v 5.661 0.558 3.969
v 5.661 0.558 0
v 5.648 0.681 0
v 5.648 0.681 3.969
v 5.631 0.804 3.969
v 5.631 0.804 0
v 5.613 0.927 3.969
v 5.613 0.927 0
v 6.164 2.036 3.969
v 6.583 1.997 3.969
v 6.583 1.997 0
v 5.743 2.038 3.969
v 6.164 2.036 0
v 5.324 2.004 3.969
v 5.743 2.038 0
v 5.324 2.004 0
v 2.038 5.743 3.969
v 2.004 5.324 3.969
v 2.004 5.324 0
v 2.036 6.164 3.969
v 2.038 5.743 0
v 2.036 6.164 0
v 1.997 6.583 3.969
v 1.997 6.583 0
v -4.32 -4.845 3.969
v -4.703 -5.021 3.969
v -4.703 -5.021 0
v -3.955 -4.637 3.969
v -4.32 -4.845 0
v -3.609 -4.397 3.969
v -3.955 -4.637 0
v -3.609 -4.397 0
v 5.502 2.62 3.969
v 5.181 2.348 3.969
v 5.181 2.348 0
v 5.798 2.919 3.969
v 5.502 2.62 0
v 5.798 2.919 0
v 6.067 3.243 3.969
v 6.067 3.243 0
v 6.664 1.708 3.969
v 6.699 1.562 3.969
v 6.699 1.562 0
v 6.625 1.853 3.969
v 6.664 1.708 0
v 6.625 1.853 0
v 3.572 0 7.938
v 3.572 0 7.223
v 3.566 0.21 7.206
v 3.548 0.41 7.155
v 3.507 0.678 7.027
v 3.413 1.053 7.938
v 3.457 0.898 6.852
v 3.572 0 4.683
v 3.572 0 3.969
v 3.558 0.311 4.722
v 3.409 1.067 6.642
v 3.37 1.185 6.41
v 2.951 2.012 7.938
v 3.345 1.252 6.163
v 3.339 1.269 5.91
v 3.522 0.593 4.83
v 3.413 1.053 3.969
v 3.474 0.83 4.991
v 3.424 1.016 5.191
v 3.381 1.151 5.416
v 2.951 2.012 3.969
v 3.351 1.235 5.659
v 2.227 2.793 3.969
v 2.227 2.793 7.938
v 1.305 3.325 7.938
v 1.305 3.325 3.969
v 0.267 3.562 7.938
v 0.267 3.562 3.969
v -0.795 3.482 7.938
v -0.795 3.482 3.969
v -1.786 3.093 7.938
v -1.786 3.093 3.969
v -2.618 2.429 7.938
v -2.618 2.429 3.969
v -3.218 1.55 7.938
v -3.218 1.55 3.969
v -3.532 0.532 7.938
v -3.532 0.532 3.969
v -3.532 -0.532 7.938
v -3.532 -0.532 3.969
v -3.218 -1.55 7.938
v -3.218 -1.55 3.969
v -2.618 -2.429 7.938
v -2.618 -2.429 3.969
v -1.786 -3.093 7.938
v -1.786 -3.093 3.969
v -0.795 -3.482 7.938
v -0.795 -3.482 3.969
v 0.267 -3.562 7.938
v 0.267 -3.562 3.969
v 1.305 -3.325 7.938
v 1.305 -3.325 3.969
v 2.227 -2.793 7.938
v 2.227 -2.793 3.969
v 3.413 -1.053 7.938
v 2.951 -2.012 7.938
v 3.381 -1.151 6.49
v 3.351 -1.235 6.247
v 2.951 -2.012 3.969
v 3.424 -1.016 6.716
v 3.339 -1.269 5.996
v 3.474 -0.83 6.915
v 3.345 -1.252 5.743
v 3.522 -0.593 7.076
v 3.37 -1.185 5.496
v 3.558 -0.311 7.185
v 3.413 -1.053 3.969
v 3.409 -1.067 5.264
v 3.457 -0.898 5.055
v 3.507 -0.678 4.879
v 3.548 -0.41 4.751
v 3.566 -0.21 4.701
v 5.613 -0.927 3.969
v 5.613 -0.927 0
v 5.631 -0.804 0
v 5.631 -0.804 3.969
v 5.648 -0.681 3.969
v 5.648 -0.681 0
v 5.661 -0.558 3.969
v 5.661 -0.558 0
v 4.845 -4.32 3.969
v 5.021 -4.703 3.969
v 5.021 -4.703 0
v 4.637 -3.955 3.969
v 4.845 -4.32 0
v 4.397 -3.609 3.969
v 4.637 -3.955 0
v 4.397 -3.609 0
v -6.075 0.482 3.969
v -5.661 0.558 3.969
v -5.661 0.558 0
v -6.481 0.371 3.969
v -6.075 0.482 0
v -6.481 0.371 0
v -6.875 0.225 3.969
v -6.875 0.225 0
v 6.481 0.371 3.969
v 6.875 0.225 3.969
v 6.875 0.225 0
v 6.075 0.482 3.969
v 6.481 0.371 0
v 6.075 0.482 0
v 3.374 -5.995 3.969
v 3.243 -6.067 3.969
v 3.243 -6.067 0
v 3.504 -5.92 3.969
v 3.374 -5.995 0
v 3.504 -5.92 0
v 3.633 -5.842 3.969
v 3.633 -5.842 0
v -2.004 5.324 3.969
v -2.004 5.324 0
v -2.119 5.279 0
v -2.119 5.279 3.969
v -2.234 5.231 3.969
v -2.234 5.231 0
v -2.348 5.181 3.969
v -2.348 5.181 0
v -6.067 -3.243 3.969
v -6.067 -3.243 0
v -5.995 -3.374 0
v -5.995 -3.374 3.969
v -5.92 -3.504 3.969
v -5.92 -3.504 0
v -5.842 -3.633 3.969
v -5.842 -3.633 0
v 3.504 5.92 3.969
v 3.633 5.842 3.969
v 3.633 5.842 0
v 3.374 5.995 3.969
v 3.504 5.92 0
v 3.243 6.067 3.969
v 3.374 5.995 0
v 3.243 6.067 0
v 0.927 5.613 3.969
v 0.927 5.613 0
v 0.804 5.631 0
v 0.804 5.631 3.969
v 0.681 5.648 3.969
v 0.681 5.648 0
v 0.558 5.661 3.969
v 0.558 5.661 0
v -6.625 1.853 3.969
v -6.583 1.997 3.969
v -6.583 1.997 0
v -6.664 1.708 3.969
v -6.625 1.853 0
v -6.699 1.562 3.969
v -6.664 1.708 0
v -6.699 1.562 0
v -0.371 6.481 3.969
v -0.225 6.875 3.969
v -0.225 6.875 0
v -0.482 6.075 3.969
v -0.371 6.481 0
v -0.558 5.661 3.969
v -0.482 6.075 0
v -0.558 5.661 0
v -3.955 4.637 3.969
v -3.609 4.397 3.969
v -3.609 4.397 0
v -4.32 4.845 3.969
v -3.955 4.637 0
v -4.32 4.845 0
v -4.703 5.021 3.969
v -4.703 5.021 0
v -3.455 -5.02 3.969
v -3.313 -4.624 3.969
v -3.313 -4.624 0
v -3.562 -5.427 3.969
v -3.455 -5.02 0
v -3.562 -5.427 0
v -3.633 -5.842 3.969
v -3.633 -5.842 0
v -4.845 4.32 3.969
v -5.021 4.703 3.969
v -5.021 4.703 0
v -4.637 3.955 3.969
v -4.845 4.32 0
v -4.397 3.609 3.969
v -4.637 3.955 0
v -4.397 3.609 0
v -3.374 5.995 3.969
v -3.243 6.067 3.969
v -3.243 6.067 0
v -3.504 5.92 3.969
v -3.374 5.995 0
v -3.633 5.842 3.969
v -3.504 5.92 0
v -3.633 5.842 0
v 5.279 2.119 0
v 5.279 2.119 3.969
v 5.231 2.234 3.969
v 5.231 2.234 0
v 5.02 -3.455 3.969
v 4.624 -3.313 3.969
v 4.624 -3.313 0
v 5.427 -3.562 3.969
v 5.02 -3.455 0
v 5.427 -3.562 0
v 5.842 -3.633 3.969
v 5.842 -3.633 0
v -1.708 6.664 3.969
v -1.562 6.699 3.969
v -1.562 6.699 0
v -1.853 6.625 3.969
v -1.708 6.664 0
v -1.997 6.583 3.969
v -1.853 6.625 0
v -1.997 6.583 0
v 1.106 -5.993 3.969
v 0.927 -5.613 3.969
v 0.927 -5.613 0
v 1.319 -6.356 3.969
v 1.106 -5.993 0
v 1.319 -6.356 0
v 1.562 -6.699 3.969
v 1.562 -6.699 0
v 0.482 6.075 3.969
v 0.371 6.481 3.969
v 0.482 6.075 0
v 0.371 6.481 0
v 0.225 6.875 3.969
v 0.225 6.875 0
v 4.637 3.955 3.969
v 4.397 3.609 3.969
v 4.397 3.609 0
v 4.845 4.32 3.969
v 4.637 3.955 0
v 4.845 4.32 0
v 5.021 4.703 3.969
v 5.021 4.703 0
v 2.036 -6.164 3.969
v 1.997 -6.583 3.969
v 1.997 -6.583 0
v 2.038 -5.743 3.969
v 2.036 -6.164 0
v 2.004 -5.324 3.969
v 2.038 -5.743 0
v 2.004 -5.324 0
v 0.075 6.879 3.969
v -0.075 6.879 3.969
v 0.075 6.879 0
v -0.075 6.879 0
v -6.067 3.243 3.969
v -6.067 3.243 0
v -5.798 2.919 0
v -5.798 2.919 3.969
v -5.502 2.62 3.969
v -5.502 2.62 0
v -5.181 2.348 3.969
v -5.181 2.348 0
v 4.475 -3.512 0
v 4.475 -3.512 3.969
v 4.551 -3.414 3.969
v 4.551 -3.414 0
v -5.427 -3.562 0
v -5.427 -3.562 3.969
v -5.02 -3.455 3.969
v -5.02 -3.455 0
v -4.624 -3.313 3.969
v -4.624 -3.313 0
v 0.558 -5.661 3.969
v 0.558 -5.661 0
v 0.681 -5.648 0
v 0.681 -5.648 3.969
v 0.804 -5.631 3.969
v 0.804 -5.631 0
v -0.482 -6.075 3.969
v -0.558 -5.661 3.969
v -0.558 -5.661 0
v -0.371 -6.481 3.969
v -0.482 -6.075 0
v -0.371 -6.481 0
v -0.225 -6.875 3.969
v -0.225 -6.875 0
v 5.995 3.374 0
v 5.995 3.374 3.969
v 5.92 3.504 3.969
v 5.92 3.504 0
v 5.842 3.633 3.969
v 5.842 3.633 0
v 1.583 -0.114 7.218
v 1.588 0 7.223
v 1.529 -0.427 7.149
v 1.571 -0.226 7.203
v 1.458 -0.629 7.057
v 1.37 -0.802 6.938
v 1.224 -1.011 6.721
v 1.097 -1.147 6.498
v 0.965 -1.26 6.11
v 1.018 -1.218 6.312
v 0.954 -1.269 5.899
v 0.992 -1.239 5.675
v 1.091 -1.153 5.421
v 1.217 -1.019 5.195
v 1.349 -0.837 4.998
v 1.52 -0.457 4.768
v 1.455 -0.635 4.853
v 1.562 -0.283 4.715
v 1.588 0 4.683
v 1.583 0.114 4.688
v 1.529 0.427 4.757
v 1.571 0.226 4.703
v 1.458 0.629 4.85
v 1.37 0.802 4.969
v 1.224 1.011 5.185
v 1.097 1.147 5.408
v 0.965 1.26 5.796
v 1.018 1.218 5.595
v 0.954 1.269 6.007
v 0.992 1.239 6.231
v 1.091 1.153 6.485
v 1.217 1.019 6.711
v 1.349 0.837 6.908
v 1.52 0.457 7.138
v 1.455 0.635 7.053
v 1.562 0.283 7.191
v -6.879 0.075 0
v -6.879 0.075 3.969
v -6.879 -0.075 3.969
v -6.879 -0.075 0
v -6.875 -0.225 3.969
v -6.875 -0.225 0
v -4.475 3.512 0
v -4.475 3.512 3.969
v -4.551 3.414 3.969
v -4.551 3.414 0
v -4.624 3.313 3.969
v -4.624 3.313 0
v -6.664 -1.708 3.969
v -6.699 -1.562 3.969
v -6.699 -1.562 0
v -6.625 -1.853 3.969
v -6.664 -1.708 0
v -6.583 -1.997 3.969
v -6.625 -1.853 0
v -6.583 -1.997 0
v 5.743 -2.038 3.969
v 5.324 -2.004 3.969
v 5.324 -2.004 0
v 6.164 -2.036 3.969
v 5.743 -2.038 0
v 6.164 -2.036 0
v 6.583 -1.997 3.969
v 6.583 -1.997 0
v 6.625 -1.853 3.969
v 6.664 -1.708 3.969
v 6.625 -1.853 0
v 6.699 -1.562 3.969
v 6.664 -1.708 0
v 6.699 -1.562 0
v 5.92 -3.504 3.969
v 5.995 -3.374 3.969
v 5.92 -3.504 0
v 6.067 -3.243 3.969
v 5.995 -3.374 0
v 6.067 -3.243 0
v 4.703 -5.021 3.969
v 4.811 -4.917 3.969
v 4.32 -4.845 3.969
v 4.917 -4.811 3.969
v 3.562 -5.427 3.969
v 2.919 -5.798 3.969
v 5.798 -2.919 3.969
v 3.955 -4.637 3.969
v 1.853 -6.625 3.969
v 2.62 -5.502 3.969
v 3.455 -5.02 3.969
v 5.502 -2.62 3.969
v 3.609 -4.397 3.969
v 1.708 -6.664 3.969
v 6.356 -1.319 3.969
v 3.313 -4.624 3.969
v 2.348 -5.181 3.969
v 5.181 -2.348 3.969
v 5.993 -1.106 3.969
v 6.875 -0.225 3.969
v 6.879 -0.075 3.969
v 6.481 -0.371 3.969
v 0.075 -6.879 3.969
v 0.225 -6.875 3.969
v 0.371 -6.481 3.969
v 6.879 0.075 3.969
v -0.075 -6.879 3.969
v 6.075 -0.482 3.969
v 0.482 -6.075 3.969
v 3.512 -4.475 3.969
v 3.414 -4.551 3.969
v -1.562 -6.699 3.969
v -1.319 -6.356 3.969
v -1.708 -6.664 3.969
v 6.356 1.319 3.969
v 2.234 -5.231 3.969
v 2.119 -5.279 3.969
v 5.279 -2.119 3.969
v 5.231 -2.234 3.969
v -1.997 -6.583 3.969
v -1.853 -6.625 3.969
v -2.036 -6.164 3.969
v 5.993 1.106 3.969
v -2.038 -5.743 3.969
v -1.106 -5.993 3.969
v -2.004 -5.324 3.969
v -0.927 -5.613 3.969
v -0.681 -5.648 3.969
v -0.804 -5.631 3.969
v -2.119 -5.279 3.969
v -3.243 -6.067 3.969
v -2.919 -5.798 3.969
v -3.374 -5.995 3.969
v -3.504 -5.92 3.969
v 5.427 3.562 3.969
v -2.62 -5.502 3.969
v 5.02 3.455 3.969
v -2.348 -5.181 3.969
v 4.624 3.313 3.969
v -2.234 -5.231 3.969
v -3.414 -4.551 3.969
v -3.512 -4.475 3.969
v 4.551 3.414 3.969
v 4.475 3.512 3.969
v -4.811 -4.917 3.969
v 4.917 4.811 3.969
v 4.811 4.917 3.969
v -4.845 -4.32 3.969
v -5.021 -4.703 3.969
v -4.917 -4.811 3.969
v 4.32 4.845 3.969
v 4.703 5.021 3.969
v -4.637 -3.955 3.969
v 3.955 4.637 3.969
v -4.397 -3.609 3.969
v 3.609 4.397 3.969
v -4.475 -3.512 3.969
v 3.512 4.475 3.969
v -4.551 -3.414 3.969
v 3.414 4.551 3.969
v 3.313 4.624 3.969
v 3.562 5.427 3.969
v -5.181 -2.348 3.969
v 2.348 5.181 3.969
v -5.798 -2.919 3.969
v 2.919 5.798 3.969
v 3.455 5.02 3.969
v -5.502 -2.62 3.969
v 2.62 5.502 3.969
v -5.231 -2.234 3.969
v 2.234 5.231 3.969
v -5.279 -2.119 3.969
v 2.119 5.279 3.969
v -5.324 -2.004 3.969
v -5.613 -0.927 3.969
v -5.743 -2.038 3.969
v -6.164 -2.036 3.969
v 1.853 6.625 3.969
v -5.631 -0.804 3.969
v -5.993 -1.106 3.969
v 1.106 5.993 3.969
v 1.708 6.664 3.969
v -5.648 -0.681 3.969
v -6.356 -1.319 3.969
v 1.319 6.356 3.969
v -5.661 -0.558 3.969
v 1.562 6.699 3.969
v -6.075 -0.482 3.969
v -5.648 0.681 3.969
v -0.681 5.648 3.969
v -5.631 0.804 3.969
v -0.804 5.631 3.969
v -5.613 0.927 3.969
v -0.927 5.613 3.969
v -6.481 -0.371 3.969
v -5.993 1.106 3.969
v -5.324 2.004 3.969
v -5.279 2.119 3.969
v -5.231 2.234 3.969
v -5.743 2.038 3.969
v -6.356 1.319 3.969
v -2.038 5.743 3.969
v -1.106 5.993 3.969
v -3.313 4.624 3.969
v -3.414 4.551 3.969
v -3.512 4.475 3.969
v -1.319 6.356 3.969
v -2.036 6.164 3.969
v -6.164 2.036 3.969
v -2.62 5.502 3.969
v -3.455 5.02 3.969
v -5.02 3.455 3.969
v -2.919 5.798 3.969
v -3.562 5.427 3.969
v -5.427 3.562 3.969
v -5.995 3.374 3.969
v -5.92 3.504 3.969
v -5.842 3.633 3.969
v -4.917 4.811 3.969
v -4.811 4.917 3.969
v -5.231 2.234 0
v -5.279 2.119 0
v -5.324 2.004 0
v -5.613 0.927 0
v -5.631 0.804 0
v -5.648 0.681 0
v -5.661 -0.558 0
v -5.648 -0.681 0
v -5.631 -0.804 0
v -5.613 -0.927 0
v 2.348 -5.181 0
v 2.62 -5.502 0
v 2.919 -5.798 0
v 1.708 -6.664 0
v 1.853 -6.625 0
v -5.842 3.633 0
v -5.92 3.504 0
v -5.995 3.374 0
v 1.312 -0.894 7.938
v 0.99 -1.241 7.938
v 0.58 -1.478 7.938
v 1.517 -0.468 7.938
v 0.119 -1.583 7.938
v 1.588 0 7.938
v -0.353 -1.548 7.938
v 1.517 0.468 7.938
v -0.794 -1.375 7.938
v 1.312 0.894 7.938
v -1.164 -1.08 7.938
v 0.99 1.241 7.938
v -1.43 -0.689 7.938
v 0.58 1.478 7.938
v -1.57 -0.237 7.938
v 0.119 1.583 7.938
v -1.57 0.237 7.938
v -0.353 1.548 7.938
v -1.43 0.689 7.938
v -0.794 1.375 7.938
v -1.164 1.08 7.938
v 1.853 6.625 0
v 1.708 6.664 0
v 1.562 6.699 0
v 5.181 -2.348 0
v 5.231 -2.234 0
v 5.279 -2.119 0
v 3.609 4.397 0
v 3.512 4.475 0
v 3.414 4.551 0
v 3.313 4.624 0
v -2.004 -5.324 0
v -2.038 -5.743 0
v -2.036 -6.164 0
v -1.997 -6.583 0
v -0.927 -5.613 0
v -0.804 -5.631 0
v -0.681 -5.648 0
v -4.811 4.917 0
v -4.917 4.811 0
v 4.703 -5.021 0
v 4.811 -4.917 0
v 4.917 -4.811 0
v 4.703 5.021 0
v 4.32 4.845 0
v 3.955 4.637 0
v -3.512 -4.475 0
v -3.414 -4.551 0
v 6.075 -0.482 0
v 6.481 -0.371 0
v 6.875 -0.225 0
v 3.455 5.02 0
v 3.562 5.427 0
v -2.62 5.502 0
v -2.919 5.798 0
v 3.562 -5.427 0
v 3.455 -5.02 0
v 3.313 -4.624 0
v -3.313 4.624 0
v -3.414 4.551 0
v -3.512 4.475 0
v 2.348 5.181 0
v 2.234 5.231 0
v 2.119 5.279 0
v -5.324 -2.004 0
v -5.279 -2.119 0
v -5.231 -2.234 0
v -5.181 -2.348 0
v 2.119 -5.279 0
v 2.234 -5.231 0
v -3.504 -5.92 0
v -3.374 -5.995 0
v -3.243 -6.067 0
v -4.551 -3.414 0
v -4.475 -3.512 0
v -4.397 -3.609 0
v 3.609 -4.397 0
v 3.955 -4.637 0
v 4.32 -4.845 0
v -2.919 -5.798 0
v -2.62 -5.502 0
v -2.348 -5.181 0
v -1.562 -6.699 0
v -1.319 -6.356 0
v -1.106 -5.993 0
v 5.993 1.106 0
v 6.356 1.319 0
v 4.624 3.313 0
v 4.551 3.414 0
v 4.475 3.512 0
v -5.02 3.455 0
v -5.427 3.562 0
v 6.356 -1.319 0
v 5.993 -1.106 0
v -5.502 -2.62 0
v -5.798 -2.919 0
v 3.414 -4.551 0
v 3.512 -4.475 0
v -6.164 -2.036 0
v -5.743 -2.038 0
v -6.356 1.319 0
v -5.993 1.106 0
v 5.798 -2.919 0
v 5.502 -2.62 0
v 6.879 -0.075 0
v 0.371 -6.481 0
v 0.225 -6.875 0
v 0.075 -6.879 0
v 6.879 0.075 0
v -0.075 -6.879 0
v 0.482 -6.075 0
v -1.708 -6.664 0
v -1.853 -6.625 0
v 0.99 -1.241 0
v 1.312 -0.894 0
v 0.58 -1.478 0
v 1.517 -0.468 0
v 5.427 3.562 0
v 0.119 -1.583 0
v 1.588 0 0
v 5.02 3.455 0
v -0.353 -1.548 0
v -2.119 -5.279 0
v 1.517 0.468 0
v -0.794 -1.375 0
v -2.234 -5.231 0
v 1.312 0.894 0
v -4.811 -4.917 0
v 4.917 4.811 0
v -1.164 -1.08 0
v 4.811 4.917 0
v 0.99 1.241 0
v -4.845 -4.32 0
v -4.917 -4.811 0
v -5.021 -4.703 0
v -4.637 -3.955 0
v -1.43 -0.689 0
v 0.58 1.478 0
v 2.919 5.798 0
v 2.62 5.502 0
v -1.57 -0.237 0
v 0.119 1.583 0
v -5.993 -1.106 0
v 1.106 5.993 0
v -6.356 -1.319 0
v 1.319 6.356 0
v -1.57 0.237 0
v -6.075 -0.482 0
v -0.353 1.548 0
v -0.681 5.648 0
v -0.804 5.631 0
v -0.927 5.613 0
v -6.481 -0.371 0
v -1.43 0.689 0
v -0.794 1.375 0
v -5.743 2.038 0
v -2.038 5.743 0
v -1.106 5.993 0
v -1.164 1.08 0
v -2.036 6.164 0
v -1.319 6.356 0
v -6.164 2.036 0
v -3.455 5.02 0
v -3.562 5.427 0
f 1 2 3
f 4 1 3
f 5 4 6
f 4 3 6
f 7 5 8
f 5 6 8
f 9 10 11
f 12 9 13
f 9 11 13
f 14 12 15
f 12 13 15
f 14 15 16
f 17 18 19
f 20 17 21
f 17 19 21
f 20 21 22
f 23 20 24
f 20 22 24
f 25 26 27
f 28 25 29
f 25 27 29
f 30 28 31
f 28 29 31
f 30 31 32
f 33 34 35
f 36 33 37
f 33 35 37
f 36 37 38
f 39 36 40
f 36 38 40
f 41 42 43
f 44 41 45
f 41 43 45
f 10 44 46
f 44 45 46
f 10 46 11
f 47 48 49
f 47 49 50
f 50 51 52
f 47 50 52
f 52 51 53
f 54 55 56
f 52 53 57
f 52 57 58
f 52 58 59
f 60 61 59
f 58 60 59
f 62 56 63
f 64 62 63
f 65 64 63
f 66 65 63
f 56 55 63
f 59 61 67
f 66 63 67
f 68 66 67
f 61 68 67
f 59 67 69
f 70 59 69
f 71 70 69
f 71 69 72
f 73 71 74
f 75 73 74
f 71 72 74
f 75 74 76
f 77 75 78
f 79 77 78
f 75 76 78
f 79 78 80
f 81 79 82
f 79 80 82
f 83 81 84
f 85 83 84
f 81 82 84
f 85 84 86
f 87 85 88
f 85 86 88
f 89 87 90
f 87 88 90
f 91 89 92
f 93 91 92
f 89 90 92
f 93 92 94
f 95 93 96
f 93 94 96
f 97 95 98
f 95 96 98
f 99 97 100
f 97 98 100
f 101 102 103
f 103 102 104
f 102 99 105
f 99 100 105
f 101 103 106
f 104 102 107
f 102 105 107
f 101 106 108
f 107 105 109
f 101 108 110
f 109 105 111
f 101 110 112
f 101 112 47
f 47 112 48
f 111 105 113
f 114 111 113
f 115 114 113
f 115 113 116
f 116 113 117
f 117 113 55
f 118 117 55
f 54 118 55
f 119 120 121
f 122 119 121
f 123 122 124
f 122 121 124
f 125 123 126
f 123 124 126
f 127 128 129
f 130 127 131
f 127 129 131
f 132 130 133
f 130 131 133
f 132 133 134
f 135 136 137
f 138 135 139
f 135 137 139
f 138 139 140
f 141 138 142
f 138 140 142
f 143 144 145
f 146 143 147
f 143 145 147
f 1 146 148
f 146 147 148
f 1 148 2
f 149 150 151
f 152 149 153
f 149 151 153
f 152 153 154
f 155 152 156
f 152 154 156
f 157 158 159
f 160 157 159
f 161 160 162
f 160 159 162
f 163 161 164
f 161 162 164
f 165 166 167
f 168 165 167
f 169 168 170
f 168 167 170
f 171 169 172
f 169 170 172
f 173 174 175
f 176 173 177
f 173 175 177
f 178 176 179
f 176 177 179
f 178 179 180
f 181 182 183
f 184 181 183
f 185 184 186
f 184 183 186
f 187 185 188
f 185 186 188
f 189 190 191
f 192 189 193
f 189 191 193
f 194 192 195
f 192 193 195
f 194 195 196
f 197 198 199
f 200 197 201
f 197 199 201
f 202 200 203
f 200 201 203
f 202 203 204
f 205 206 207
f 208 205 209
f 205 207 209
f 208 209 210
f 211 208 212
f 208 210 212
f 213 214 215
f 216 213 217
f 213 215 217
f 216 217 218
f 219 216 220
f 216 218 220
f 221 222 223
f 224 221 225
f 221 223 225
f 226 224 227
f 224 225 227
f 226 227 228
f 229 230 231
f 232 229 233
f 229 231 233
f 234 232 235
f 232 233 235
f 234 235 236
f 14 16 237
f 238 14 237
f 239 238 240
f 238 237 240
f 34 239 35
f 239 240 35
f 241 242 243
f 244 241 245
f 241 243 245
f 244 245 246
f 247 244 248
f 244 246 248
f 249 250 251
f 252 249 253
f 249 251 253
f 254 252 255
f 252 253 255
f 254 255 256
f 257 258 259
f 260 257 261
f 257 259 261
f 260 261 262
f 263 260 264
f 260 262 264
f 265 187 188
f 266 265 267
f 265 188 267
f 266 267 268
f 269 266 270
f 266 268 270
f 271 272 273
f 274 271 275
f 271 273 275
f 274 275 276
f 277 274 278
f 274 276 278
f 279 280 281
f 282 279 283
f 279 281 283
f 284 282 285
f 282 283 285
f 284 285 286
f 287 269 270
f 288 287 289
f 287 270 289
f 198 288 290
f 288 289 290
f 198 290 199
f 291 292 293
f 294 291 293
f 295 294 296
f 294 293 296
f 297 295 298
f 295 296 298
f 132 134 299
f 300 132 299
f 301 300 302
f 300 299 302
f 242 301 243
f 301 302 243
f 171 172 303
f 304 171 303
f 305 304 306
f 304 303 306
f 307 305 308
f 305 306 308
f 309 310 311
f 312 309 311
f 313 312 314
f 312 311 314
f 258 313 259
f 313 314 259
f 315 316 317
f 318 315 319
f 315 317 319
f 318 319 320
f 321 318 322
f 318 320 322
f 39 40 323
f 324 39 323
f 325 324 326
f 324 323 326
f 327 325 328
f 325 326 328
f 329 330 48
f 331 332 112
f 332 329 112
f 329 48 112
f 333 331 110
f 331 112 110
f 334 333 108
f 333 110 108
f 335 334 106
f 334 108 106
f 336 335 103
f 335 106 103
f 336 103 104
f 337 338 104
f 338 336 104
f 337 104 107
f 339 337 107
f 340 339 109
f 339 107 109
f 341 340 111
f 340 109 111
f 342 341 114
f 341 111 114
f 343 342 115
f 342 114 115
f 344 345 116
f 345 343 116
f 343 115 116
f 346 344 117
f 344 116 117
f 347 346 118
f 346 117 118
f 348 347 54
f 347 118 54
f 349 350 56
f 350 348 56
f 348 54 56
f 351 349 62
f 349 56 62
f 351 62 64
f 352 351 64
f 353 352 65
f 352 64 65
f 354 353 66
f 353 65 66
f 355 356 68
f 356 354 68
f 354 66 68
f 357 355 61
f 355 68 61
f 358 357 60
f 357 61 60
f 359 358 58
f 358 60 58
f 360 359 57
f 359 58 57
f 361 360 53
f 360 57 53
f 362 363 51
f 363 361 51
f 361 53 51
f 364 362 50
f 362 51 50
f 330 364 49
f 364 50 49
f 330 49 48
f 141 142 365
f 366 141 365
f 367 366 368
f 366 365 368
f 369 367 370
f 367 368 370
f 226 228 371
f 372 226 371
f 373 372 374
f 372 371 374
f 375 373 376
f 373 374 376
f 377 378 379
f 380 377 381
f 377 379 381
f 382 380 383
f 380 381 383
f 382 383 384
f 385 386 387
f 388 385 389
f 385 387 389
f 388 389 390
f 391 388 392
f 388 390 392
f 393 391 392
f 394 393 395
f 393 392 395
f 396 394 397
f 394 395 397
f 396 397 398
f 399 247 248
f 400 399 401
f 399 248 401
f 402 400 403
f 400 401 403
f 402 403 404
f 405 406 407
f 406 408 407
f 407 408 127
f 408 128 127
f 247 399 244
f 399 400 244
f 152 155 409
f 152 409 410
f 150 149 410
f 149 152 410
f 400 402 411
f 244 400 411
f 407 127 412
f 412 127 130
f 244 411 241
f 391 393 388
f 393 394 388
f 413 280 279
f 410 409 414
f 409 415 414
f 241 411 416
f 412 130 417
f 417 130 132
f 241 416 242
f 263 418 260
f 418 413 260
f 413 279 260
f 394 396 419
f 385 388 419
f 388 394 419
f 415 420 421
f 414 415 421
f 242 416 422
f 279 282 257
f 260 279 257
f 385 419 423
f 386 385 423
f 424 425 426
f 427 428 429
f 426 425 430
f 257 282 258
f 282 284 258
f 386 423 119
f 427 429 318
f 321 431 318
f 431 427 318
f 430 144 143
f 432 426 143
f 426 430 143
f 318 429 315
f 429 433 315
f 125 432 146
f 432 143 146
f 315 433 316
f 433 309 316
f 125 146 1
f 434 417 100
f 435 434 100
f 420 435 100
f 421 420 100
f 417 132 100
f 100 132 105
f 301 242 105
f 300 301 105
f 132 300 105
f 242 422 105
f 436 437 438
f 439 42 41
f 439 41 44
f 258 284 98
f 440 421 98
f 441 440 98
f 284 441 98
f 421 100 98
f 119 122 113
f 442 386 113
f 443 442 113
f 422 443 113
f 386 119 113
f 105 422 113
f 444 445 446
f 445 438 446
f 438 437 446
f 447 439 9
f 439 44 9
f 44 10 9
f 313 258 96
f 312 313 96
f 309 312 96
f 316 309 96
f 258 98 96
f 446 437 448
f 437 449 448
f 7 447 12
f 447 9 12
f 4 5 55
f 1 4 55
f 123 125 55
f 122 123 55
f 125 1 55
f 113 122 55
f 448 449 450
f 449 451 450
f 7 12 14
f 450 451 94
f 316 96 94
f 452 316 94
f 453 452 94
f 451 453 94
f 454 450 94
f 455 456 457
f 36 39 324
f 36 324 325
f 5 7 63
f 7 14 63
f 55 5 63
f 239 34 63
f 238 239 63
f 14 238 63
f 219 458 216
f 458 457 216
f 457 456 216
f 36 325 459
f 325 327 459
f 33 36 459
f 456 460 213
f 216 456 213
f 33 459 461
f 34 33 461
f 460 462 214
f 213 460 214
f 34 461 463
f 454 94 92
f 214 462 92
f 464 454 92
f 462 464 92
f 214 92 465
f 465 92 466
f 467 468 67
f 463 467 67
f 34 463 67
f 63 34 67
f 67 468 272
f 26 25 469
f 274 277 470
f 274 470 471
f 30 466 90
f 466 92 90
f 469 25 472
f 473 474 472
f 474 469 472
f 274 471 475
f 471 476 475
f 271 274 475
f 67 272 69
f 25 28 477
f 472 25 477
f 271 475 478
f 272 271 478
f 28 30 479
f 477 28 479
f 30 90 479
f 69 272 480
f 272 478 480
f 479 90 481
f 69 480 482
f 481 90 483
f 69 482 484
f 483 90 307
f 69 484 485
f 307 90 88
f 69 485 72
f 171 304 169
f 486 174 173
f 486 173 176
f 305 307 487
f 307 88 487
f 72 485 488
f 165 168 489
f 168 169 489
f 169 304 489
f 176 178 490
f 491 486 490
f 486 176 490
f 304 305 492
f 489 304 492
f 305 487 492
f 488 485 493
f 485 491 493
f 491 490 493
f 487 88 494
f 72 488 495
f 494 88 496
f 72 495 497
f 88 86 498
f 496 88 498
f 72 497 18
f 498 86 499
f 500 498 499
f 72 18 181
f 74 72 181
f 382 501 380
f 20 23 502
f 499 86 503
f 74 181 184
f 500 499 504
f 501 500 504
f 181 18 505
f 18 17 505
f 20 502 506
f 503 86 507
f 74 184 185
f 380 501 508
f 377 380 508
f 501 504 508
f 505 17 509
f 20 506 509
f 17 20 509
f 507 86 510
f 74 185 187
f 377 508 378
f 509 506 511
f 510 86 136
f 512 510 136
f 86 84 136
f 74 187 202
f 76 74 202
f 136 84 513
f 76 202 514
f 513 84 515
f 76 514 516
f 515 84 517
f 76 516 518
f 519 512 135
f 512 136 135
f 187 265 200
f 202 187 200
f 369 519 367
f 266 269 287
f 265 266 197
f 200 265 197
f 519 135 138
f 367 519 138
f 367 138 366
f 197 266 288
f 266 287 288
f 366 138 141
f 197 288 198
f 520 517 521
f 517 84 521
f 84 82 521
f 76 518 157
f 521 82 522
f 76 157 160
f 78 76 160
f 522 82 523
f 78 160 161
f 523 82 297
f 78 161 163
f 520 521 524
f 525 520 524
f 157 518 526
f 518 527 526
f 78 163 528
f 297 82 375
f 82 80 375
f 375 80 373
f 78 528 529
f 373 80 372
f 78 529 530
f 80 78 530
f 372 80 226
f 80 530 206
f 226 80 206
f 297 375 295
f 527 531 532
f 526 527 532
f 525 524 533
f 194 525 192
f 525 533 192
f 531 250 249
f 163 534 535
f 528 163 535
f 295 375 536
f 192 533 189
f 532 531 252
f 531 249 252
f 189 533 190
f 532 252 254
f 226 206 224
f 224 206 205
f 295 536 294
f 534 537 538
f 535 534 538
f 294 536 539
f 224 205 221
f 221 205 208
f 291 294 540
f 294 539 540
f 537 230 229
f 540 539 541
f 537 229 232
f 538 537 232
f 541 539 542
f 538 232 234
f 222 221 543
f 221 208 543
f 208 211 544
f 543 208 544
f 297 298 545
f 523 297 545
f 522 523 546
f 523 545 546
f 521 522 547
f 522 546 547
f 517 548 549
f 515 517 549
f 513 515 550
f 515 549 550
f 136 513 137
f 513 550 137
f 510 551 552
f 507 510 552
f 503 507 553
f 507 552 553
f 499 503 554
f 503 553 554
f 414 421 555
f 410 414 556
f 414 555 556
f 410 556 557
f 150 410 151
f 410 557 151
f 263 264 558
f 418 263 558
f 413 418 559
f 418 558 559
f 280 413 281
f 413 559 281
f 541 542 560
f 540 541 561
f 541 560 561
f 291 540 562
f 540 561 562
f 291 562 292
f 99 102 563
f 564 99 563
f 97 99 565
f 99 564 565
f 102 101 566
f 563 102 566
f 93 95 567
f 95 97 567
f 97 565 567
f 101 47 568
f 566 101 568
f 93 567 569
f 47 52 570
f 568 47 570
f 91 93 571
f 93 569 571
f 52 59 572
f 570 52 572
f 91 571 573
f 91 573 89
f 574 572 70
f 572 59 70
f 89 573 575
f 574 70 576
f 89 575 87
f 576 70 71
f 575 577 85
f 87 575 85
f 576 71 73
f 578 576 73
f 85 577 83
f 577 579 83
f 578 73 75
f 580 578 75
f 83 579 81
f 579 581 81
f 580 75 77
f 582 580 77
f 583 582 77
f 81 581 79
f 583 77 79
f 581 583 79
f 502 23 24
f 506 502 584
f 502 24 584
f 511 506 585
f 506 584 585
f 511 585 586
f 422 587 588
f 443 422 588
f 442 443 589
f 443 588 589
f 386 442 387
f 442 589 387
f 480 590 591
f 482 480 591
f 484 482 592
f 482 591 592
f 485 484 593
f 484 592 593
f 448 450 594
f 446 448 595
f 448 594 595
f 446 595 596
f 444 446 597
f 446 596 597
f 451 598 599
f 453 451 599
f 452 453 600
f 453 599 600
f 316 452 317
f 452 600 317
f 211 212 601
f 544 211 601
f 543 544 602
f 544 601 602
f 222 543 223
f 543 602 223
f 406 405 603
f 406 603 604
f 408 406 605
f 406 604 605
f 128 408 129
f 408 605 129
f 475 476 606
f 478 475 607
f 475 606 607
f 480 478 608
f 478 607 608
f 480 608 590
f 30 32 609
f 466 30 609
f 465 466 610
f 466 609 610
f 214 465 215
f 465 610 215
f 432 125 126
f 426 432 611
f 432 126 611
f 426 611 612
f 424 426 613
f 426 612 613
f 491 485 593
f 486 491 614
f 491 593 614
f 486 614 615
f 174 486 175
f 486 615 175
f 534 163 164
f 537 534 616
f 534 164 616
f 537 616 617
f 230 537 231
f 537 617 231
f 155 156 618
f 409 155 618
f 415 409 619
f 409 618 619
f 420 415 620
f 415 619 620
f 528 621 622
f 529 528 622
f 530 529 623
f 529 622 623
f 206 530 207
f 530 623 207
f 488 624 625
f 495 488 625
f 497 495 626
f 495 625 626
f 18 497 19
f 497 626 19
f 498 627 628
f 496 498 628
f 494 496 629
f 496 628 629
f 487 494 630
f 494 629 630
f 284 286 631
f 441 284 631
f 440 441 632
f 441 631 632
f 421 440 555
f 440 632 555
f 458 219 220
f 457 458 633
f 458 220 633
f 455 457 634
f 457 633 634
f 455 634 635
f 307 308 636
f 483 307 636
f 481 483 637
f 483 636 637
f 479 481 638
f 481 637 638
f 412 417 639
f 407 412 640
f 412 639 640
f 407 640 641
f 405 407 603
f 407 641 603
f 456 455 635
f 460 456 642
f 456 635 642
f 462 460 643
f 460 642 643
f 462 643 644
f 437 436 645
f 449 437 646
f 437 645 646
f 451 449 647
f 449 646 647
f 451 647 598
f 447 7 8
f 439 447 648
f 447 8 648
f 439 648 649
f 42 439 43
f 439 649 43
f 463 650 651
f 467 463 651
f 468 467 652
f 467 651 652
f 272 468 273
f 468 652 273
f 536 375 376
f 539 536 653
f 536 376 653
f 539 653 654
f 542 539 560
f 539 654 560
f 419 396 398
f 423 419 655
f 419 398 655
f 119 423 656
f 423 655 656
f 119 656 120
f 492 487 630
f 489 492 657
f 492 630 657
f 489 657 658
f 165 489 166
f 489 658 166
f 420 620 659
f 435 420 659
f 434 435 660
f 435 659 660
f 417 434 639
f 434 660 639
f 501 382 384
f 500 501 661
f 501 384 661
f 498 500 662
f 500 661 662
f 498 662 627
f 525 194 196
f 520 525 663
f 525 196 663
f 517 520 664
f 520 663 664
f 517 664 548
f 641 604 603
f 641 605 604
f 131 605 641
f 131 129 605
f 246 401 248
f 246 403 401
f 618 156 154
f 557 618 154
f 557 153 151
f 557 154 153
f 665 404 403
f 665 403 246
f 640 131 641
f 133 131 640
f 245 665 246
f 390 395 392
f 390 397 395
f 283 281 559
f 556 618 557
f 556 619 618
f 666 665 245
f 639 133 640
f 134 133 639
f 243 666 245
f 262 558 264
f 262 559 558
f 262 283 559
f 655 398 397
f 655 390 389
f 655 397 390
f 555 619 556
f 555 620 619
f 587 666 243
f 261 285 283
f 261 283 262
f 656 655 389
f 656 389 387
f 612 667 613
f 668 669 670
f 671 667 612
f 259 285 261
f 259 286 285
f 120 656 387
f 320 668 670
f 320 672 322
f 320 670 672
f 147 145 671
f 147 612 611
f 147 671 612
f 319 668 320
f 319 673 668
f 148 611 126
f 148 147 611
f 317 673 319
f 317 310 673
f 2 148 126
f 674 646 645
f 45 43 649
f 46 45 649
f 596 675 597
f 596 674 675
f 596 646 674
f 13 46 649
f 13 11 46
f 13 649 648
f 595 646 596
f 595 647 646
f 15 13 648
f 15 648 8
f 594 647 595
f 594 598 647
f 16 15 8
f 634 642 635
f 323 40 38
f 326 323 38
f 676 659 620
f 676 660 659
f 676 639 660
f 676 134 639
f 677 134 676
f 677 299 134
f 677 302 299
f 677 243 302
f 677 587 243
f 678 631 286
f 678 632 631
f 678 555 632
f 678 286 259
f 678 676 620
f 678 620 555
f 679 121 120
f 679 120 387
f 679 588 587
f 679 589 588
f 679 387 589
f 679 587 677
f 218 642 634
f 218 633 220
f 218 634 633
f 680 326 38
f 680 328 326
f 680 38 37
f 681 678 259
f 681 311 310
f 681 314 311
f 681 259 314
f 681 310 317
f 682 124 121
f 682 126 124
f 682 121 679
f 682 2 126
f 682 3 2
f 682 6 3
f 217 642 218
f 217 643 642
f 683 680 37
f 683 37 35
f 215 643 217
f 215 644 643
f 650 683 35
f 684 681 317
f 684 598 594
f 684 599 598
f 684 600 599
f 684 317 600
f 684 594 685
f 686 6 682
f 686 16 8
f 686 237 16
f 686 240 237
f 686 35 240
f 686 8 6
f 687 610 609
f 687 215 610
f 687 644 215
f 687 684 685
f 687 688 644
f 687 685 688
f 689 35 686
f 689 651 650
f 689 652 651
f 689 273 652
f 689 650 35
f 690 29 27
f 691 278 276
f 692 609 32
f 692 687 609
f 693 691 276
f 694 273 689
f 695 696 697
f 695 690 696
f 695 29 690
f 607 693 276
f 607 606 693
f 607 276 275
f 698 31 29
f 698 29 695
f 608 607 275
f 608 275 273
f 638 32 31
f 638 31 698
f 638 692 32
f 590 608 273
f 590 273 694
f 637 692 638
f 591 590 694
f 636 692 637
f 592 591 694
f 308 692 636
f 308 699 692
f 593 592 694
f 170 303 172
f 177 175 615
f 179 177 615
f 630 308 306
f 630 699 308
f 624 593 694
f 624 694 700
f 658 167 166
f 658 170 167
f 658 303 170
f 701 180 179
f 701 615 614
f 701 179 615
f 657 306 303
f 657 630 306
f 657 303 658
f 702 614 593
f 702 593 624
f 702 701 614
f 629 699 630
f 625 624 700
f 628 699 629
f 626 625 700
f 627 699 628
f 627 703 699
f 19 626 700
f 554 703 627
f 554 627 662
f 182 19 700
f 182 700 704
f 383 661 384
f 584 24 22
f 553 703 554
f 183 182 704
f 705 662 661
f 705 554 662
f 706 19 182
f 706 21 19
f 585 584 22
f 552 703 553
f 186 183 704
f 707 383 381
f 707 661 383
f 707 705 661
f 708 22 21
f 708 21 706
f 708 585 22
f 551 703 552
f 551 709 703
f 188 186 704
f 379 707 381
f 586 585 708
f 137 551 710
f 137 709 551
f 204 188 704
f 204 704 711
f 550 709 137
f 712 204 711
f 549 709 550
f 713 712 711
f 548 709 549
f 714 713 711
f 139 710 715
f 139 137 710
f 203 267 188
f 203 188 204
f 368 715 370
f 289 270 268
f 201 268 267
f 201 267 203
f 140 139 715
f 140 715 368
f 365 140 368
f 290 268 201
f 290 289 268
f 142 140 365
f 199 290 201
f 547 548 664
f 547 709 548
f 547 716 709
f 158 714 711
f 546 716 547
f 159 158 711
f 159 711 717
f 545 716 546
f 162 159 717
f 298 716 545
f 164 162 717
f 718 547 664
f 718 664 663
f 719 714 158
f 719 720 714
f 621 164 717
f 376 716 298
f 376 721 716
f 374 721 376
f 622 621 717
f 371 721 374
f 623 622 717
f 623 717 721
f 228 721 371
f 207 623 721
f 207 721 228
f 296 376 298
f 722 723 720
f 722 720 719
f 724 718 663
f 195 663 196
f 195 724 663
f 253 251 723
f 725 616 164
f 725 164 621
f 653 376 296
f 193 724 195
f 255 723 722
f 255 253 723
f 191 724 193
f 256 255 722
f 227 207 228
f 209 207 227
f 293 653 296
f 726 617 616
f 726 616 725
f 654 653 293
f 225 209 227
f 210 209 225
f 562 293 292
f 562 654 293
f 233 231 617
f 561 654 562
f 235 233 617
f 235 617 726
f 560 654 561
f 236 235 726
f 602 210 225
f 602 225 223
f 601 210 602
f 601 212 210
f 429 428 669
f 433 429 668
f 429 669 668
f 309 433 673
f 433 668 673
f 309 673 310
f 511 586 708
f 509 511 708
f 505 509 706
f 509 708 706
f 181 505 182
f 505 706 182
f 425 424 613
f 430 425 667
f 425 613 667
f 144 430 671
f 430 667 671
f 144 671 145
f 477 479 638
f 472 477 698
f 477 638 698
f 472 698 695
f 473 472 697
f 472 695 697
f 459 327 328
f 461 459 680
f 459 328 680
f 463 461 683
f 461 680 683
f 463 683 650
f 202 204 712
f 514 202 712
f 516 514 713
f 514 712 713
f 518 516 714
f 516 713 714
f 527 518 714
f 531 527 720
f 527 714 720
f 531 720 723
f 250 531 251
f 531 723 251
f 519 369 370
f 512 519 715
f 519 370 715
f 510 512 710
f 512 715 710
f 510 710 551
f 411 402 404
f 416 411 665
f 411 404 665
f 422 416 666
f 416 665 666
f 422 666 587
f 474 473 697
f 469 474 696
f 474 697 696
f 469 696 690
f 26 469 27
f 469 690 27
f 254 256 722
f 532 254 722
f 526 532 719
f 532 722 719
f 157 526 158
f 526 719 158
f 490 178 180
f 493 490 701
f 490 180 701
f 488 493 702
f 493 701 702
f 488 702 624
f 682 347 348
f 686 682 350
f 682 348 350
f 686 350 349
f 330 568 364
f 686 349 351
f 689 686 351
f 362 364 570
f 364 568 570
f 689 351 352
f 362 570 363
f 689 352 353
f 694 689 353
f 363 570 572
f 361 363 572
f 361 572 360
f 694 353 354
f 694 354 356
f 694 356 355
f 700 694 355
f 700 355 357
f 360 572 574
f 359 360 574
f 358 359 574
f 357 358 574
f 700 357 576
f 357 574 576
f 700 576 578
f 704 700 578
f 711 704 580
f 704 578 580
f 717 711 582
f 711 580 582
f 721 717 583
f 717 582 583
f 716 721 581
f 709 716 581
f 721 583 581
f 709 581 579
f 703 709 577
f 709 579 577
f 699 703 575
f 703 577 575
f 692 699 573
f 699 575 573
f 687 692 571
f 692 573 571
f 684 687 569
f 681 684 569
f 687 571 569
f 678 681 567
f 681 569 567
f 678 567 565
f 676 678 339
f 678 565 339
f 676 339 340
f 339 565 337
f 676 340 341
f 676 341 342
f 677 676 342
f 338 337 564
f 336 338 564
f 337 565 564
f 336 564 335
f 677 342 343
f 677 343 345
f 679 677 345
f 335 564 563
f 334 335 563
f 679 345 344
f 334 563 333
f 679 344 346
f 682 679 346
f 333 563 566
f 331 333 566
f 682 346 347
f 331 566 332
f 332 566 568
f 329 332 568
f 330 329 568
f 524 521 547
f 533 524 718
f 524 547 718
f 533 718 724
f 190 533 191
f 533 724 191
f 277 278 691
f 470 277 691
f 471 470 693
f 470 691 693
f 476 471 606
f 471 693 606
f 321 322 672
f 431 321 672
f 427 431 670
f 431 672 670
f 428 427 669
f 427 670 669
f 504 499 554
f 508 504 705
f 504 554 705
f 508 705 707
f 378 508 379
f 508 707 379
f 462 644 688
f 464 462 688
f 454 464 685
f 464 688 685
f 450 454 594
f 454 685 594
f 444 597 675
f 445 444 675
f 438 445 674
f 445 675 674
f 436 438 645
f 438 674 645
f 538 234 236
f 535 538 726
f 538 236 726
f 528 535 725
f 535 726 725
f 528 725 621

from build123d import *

# Parameters (mm, degrees)
SKETCH1_W          = 6.879166709
SKETCH1_H          = 3.96875
CUT_EXTRUDE1_DEPTH = 11.506990329
CIRPATTERN1_COUNT  = 24
SKETCH26_W         = 3.571875
SKETCH26_H         = 3.96875
HOLE1_D            = 3.175
SKETCH29_W         = 1.27
SKETCH29_H         = 5.926666709


with BuildPart() as part:
    # Sketch1 → Revolve1 (revolve)
    with BuildSketch(Plane(origin=(0, 0, 0), x_dir=(1, 0, 0), z_dir=(0, 1, 0))):
        with Locations((3.439583355, -1.984375)):
            Rectangle(SKETCH1_W, SKETCH1_H)
    revolve(axis=Axis((0, 0, 0), (0, 0, 1)))

    # Sketch2 → Cut-Extrude1 (cut, through all)
    with BuildSketch(Plane(origin=(0, 0, 0), x_dir=(-1, 0, 0), z_dir=(0, 0, -1))):
        with BuildLine():
            ThreePointArc((4.702545407, 5.020856631), (4.187771356, 5.457609887), (3.632666778, 5.841803376))
            ThreePointArc((3.632666778, 5.841803376), (3.513181537, 5.22234108), (3.313448673, 4.623912268))
            ThreePointArc((3.313448673, 4.623912268), (3.46296478, 4.513023566), (3.608772657, 4.397302205))
            ThreePointArc((3.608772657, 4.397302205), (4.135115832, 4.74511411), (4.702545407, 5.020856631))
        make_face()
    cut_extrude1 = extrude(amount=-CUT_EXTRUDE1_DEPTH, mode=Mode.SUBTRACT)

    # CirPattern1: Cut-Extrude1 ×24 about axis
    cirpattern1_axis = Axis((0, 0, 0), (0, 0, 1))
    for i in range(1, CIRPATTERN1_COUNT):
        add(cut_extrude1.rotate(cirpattern1_axis, i * 360 / CIRPATTERN1_COUNT), mode=Mode.SUBTRACT)

    # Sketch26 → Revolve2 (revolve)
    with BuildSketch(Plane(origin=(0, 0, 0), x_dir=(1, 0, 0), z_dir=(0, 1, 0))):
        with Locations((1.7859375, -5.953125)):
            Rectangle(SKETCH26_W, SKETCH26_H)
    revolve(axis=Axis((0, 0, 3.96875), (0, 0, 1)))

    # Hole1 (through all)
    with Locations(Plane(origin=(0, 0, 0), x_dir=(-1, 0, 0), z_dir=(0, 0, -1))):
        with Locations((0, 0)):
            Hole(HOLE1_D / 2)

    # Sketch29 → M2 Clearance Hole1 (revolve, cut)
    with BuildSketch(Plane(origin=(0.9525, 0, 5.953125), x_dir=(0, 0, 1), z_dir=(0, 1, 0))):
        with Locations((0.635, 2.963333355)):
            Rectangle(SKETCH29_W, SKETCH29_H)
    revolve(axis=Axis((-5.3975, 0, 5.953125), (1, 0, 0)), mode=Mode.SUBTRACT)


solid = part.part
